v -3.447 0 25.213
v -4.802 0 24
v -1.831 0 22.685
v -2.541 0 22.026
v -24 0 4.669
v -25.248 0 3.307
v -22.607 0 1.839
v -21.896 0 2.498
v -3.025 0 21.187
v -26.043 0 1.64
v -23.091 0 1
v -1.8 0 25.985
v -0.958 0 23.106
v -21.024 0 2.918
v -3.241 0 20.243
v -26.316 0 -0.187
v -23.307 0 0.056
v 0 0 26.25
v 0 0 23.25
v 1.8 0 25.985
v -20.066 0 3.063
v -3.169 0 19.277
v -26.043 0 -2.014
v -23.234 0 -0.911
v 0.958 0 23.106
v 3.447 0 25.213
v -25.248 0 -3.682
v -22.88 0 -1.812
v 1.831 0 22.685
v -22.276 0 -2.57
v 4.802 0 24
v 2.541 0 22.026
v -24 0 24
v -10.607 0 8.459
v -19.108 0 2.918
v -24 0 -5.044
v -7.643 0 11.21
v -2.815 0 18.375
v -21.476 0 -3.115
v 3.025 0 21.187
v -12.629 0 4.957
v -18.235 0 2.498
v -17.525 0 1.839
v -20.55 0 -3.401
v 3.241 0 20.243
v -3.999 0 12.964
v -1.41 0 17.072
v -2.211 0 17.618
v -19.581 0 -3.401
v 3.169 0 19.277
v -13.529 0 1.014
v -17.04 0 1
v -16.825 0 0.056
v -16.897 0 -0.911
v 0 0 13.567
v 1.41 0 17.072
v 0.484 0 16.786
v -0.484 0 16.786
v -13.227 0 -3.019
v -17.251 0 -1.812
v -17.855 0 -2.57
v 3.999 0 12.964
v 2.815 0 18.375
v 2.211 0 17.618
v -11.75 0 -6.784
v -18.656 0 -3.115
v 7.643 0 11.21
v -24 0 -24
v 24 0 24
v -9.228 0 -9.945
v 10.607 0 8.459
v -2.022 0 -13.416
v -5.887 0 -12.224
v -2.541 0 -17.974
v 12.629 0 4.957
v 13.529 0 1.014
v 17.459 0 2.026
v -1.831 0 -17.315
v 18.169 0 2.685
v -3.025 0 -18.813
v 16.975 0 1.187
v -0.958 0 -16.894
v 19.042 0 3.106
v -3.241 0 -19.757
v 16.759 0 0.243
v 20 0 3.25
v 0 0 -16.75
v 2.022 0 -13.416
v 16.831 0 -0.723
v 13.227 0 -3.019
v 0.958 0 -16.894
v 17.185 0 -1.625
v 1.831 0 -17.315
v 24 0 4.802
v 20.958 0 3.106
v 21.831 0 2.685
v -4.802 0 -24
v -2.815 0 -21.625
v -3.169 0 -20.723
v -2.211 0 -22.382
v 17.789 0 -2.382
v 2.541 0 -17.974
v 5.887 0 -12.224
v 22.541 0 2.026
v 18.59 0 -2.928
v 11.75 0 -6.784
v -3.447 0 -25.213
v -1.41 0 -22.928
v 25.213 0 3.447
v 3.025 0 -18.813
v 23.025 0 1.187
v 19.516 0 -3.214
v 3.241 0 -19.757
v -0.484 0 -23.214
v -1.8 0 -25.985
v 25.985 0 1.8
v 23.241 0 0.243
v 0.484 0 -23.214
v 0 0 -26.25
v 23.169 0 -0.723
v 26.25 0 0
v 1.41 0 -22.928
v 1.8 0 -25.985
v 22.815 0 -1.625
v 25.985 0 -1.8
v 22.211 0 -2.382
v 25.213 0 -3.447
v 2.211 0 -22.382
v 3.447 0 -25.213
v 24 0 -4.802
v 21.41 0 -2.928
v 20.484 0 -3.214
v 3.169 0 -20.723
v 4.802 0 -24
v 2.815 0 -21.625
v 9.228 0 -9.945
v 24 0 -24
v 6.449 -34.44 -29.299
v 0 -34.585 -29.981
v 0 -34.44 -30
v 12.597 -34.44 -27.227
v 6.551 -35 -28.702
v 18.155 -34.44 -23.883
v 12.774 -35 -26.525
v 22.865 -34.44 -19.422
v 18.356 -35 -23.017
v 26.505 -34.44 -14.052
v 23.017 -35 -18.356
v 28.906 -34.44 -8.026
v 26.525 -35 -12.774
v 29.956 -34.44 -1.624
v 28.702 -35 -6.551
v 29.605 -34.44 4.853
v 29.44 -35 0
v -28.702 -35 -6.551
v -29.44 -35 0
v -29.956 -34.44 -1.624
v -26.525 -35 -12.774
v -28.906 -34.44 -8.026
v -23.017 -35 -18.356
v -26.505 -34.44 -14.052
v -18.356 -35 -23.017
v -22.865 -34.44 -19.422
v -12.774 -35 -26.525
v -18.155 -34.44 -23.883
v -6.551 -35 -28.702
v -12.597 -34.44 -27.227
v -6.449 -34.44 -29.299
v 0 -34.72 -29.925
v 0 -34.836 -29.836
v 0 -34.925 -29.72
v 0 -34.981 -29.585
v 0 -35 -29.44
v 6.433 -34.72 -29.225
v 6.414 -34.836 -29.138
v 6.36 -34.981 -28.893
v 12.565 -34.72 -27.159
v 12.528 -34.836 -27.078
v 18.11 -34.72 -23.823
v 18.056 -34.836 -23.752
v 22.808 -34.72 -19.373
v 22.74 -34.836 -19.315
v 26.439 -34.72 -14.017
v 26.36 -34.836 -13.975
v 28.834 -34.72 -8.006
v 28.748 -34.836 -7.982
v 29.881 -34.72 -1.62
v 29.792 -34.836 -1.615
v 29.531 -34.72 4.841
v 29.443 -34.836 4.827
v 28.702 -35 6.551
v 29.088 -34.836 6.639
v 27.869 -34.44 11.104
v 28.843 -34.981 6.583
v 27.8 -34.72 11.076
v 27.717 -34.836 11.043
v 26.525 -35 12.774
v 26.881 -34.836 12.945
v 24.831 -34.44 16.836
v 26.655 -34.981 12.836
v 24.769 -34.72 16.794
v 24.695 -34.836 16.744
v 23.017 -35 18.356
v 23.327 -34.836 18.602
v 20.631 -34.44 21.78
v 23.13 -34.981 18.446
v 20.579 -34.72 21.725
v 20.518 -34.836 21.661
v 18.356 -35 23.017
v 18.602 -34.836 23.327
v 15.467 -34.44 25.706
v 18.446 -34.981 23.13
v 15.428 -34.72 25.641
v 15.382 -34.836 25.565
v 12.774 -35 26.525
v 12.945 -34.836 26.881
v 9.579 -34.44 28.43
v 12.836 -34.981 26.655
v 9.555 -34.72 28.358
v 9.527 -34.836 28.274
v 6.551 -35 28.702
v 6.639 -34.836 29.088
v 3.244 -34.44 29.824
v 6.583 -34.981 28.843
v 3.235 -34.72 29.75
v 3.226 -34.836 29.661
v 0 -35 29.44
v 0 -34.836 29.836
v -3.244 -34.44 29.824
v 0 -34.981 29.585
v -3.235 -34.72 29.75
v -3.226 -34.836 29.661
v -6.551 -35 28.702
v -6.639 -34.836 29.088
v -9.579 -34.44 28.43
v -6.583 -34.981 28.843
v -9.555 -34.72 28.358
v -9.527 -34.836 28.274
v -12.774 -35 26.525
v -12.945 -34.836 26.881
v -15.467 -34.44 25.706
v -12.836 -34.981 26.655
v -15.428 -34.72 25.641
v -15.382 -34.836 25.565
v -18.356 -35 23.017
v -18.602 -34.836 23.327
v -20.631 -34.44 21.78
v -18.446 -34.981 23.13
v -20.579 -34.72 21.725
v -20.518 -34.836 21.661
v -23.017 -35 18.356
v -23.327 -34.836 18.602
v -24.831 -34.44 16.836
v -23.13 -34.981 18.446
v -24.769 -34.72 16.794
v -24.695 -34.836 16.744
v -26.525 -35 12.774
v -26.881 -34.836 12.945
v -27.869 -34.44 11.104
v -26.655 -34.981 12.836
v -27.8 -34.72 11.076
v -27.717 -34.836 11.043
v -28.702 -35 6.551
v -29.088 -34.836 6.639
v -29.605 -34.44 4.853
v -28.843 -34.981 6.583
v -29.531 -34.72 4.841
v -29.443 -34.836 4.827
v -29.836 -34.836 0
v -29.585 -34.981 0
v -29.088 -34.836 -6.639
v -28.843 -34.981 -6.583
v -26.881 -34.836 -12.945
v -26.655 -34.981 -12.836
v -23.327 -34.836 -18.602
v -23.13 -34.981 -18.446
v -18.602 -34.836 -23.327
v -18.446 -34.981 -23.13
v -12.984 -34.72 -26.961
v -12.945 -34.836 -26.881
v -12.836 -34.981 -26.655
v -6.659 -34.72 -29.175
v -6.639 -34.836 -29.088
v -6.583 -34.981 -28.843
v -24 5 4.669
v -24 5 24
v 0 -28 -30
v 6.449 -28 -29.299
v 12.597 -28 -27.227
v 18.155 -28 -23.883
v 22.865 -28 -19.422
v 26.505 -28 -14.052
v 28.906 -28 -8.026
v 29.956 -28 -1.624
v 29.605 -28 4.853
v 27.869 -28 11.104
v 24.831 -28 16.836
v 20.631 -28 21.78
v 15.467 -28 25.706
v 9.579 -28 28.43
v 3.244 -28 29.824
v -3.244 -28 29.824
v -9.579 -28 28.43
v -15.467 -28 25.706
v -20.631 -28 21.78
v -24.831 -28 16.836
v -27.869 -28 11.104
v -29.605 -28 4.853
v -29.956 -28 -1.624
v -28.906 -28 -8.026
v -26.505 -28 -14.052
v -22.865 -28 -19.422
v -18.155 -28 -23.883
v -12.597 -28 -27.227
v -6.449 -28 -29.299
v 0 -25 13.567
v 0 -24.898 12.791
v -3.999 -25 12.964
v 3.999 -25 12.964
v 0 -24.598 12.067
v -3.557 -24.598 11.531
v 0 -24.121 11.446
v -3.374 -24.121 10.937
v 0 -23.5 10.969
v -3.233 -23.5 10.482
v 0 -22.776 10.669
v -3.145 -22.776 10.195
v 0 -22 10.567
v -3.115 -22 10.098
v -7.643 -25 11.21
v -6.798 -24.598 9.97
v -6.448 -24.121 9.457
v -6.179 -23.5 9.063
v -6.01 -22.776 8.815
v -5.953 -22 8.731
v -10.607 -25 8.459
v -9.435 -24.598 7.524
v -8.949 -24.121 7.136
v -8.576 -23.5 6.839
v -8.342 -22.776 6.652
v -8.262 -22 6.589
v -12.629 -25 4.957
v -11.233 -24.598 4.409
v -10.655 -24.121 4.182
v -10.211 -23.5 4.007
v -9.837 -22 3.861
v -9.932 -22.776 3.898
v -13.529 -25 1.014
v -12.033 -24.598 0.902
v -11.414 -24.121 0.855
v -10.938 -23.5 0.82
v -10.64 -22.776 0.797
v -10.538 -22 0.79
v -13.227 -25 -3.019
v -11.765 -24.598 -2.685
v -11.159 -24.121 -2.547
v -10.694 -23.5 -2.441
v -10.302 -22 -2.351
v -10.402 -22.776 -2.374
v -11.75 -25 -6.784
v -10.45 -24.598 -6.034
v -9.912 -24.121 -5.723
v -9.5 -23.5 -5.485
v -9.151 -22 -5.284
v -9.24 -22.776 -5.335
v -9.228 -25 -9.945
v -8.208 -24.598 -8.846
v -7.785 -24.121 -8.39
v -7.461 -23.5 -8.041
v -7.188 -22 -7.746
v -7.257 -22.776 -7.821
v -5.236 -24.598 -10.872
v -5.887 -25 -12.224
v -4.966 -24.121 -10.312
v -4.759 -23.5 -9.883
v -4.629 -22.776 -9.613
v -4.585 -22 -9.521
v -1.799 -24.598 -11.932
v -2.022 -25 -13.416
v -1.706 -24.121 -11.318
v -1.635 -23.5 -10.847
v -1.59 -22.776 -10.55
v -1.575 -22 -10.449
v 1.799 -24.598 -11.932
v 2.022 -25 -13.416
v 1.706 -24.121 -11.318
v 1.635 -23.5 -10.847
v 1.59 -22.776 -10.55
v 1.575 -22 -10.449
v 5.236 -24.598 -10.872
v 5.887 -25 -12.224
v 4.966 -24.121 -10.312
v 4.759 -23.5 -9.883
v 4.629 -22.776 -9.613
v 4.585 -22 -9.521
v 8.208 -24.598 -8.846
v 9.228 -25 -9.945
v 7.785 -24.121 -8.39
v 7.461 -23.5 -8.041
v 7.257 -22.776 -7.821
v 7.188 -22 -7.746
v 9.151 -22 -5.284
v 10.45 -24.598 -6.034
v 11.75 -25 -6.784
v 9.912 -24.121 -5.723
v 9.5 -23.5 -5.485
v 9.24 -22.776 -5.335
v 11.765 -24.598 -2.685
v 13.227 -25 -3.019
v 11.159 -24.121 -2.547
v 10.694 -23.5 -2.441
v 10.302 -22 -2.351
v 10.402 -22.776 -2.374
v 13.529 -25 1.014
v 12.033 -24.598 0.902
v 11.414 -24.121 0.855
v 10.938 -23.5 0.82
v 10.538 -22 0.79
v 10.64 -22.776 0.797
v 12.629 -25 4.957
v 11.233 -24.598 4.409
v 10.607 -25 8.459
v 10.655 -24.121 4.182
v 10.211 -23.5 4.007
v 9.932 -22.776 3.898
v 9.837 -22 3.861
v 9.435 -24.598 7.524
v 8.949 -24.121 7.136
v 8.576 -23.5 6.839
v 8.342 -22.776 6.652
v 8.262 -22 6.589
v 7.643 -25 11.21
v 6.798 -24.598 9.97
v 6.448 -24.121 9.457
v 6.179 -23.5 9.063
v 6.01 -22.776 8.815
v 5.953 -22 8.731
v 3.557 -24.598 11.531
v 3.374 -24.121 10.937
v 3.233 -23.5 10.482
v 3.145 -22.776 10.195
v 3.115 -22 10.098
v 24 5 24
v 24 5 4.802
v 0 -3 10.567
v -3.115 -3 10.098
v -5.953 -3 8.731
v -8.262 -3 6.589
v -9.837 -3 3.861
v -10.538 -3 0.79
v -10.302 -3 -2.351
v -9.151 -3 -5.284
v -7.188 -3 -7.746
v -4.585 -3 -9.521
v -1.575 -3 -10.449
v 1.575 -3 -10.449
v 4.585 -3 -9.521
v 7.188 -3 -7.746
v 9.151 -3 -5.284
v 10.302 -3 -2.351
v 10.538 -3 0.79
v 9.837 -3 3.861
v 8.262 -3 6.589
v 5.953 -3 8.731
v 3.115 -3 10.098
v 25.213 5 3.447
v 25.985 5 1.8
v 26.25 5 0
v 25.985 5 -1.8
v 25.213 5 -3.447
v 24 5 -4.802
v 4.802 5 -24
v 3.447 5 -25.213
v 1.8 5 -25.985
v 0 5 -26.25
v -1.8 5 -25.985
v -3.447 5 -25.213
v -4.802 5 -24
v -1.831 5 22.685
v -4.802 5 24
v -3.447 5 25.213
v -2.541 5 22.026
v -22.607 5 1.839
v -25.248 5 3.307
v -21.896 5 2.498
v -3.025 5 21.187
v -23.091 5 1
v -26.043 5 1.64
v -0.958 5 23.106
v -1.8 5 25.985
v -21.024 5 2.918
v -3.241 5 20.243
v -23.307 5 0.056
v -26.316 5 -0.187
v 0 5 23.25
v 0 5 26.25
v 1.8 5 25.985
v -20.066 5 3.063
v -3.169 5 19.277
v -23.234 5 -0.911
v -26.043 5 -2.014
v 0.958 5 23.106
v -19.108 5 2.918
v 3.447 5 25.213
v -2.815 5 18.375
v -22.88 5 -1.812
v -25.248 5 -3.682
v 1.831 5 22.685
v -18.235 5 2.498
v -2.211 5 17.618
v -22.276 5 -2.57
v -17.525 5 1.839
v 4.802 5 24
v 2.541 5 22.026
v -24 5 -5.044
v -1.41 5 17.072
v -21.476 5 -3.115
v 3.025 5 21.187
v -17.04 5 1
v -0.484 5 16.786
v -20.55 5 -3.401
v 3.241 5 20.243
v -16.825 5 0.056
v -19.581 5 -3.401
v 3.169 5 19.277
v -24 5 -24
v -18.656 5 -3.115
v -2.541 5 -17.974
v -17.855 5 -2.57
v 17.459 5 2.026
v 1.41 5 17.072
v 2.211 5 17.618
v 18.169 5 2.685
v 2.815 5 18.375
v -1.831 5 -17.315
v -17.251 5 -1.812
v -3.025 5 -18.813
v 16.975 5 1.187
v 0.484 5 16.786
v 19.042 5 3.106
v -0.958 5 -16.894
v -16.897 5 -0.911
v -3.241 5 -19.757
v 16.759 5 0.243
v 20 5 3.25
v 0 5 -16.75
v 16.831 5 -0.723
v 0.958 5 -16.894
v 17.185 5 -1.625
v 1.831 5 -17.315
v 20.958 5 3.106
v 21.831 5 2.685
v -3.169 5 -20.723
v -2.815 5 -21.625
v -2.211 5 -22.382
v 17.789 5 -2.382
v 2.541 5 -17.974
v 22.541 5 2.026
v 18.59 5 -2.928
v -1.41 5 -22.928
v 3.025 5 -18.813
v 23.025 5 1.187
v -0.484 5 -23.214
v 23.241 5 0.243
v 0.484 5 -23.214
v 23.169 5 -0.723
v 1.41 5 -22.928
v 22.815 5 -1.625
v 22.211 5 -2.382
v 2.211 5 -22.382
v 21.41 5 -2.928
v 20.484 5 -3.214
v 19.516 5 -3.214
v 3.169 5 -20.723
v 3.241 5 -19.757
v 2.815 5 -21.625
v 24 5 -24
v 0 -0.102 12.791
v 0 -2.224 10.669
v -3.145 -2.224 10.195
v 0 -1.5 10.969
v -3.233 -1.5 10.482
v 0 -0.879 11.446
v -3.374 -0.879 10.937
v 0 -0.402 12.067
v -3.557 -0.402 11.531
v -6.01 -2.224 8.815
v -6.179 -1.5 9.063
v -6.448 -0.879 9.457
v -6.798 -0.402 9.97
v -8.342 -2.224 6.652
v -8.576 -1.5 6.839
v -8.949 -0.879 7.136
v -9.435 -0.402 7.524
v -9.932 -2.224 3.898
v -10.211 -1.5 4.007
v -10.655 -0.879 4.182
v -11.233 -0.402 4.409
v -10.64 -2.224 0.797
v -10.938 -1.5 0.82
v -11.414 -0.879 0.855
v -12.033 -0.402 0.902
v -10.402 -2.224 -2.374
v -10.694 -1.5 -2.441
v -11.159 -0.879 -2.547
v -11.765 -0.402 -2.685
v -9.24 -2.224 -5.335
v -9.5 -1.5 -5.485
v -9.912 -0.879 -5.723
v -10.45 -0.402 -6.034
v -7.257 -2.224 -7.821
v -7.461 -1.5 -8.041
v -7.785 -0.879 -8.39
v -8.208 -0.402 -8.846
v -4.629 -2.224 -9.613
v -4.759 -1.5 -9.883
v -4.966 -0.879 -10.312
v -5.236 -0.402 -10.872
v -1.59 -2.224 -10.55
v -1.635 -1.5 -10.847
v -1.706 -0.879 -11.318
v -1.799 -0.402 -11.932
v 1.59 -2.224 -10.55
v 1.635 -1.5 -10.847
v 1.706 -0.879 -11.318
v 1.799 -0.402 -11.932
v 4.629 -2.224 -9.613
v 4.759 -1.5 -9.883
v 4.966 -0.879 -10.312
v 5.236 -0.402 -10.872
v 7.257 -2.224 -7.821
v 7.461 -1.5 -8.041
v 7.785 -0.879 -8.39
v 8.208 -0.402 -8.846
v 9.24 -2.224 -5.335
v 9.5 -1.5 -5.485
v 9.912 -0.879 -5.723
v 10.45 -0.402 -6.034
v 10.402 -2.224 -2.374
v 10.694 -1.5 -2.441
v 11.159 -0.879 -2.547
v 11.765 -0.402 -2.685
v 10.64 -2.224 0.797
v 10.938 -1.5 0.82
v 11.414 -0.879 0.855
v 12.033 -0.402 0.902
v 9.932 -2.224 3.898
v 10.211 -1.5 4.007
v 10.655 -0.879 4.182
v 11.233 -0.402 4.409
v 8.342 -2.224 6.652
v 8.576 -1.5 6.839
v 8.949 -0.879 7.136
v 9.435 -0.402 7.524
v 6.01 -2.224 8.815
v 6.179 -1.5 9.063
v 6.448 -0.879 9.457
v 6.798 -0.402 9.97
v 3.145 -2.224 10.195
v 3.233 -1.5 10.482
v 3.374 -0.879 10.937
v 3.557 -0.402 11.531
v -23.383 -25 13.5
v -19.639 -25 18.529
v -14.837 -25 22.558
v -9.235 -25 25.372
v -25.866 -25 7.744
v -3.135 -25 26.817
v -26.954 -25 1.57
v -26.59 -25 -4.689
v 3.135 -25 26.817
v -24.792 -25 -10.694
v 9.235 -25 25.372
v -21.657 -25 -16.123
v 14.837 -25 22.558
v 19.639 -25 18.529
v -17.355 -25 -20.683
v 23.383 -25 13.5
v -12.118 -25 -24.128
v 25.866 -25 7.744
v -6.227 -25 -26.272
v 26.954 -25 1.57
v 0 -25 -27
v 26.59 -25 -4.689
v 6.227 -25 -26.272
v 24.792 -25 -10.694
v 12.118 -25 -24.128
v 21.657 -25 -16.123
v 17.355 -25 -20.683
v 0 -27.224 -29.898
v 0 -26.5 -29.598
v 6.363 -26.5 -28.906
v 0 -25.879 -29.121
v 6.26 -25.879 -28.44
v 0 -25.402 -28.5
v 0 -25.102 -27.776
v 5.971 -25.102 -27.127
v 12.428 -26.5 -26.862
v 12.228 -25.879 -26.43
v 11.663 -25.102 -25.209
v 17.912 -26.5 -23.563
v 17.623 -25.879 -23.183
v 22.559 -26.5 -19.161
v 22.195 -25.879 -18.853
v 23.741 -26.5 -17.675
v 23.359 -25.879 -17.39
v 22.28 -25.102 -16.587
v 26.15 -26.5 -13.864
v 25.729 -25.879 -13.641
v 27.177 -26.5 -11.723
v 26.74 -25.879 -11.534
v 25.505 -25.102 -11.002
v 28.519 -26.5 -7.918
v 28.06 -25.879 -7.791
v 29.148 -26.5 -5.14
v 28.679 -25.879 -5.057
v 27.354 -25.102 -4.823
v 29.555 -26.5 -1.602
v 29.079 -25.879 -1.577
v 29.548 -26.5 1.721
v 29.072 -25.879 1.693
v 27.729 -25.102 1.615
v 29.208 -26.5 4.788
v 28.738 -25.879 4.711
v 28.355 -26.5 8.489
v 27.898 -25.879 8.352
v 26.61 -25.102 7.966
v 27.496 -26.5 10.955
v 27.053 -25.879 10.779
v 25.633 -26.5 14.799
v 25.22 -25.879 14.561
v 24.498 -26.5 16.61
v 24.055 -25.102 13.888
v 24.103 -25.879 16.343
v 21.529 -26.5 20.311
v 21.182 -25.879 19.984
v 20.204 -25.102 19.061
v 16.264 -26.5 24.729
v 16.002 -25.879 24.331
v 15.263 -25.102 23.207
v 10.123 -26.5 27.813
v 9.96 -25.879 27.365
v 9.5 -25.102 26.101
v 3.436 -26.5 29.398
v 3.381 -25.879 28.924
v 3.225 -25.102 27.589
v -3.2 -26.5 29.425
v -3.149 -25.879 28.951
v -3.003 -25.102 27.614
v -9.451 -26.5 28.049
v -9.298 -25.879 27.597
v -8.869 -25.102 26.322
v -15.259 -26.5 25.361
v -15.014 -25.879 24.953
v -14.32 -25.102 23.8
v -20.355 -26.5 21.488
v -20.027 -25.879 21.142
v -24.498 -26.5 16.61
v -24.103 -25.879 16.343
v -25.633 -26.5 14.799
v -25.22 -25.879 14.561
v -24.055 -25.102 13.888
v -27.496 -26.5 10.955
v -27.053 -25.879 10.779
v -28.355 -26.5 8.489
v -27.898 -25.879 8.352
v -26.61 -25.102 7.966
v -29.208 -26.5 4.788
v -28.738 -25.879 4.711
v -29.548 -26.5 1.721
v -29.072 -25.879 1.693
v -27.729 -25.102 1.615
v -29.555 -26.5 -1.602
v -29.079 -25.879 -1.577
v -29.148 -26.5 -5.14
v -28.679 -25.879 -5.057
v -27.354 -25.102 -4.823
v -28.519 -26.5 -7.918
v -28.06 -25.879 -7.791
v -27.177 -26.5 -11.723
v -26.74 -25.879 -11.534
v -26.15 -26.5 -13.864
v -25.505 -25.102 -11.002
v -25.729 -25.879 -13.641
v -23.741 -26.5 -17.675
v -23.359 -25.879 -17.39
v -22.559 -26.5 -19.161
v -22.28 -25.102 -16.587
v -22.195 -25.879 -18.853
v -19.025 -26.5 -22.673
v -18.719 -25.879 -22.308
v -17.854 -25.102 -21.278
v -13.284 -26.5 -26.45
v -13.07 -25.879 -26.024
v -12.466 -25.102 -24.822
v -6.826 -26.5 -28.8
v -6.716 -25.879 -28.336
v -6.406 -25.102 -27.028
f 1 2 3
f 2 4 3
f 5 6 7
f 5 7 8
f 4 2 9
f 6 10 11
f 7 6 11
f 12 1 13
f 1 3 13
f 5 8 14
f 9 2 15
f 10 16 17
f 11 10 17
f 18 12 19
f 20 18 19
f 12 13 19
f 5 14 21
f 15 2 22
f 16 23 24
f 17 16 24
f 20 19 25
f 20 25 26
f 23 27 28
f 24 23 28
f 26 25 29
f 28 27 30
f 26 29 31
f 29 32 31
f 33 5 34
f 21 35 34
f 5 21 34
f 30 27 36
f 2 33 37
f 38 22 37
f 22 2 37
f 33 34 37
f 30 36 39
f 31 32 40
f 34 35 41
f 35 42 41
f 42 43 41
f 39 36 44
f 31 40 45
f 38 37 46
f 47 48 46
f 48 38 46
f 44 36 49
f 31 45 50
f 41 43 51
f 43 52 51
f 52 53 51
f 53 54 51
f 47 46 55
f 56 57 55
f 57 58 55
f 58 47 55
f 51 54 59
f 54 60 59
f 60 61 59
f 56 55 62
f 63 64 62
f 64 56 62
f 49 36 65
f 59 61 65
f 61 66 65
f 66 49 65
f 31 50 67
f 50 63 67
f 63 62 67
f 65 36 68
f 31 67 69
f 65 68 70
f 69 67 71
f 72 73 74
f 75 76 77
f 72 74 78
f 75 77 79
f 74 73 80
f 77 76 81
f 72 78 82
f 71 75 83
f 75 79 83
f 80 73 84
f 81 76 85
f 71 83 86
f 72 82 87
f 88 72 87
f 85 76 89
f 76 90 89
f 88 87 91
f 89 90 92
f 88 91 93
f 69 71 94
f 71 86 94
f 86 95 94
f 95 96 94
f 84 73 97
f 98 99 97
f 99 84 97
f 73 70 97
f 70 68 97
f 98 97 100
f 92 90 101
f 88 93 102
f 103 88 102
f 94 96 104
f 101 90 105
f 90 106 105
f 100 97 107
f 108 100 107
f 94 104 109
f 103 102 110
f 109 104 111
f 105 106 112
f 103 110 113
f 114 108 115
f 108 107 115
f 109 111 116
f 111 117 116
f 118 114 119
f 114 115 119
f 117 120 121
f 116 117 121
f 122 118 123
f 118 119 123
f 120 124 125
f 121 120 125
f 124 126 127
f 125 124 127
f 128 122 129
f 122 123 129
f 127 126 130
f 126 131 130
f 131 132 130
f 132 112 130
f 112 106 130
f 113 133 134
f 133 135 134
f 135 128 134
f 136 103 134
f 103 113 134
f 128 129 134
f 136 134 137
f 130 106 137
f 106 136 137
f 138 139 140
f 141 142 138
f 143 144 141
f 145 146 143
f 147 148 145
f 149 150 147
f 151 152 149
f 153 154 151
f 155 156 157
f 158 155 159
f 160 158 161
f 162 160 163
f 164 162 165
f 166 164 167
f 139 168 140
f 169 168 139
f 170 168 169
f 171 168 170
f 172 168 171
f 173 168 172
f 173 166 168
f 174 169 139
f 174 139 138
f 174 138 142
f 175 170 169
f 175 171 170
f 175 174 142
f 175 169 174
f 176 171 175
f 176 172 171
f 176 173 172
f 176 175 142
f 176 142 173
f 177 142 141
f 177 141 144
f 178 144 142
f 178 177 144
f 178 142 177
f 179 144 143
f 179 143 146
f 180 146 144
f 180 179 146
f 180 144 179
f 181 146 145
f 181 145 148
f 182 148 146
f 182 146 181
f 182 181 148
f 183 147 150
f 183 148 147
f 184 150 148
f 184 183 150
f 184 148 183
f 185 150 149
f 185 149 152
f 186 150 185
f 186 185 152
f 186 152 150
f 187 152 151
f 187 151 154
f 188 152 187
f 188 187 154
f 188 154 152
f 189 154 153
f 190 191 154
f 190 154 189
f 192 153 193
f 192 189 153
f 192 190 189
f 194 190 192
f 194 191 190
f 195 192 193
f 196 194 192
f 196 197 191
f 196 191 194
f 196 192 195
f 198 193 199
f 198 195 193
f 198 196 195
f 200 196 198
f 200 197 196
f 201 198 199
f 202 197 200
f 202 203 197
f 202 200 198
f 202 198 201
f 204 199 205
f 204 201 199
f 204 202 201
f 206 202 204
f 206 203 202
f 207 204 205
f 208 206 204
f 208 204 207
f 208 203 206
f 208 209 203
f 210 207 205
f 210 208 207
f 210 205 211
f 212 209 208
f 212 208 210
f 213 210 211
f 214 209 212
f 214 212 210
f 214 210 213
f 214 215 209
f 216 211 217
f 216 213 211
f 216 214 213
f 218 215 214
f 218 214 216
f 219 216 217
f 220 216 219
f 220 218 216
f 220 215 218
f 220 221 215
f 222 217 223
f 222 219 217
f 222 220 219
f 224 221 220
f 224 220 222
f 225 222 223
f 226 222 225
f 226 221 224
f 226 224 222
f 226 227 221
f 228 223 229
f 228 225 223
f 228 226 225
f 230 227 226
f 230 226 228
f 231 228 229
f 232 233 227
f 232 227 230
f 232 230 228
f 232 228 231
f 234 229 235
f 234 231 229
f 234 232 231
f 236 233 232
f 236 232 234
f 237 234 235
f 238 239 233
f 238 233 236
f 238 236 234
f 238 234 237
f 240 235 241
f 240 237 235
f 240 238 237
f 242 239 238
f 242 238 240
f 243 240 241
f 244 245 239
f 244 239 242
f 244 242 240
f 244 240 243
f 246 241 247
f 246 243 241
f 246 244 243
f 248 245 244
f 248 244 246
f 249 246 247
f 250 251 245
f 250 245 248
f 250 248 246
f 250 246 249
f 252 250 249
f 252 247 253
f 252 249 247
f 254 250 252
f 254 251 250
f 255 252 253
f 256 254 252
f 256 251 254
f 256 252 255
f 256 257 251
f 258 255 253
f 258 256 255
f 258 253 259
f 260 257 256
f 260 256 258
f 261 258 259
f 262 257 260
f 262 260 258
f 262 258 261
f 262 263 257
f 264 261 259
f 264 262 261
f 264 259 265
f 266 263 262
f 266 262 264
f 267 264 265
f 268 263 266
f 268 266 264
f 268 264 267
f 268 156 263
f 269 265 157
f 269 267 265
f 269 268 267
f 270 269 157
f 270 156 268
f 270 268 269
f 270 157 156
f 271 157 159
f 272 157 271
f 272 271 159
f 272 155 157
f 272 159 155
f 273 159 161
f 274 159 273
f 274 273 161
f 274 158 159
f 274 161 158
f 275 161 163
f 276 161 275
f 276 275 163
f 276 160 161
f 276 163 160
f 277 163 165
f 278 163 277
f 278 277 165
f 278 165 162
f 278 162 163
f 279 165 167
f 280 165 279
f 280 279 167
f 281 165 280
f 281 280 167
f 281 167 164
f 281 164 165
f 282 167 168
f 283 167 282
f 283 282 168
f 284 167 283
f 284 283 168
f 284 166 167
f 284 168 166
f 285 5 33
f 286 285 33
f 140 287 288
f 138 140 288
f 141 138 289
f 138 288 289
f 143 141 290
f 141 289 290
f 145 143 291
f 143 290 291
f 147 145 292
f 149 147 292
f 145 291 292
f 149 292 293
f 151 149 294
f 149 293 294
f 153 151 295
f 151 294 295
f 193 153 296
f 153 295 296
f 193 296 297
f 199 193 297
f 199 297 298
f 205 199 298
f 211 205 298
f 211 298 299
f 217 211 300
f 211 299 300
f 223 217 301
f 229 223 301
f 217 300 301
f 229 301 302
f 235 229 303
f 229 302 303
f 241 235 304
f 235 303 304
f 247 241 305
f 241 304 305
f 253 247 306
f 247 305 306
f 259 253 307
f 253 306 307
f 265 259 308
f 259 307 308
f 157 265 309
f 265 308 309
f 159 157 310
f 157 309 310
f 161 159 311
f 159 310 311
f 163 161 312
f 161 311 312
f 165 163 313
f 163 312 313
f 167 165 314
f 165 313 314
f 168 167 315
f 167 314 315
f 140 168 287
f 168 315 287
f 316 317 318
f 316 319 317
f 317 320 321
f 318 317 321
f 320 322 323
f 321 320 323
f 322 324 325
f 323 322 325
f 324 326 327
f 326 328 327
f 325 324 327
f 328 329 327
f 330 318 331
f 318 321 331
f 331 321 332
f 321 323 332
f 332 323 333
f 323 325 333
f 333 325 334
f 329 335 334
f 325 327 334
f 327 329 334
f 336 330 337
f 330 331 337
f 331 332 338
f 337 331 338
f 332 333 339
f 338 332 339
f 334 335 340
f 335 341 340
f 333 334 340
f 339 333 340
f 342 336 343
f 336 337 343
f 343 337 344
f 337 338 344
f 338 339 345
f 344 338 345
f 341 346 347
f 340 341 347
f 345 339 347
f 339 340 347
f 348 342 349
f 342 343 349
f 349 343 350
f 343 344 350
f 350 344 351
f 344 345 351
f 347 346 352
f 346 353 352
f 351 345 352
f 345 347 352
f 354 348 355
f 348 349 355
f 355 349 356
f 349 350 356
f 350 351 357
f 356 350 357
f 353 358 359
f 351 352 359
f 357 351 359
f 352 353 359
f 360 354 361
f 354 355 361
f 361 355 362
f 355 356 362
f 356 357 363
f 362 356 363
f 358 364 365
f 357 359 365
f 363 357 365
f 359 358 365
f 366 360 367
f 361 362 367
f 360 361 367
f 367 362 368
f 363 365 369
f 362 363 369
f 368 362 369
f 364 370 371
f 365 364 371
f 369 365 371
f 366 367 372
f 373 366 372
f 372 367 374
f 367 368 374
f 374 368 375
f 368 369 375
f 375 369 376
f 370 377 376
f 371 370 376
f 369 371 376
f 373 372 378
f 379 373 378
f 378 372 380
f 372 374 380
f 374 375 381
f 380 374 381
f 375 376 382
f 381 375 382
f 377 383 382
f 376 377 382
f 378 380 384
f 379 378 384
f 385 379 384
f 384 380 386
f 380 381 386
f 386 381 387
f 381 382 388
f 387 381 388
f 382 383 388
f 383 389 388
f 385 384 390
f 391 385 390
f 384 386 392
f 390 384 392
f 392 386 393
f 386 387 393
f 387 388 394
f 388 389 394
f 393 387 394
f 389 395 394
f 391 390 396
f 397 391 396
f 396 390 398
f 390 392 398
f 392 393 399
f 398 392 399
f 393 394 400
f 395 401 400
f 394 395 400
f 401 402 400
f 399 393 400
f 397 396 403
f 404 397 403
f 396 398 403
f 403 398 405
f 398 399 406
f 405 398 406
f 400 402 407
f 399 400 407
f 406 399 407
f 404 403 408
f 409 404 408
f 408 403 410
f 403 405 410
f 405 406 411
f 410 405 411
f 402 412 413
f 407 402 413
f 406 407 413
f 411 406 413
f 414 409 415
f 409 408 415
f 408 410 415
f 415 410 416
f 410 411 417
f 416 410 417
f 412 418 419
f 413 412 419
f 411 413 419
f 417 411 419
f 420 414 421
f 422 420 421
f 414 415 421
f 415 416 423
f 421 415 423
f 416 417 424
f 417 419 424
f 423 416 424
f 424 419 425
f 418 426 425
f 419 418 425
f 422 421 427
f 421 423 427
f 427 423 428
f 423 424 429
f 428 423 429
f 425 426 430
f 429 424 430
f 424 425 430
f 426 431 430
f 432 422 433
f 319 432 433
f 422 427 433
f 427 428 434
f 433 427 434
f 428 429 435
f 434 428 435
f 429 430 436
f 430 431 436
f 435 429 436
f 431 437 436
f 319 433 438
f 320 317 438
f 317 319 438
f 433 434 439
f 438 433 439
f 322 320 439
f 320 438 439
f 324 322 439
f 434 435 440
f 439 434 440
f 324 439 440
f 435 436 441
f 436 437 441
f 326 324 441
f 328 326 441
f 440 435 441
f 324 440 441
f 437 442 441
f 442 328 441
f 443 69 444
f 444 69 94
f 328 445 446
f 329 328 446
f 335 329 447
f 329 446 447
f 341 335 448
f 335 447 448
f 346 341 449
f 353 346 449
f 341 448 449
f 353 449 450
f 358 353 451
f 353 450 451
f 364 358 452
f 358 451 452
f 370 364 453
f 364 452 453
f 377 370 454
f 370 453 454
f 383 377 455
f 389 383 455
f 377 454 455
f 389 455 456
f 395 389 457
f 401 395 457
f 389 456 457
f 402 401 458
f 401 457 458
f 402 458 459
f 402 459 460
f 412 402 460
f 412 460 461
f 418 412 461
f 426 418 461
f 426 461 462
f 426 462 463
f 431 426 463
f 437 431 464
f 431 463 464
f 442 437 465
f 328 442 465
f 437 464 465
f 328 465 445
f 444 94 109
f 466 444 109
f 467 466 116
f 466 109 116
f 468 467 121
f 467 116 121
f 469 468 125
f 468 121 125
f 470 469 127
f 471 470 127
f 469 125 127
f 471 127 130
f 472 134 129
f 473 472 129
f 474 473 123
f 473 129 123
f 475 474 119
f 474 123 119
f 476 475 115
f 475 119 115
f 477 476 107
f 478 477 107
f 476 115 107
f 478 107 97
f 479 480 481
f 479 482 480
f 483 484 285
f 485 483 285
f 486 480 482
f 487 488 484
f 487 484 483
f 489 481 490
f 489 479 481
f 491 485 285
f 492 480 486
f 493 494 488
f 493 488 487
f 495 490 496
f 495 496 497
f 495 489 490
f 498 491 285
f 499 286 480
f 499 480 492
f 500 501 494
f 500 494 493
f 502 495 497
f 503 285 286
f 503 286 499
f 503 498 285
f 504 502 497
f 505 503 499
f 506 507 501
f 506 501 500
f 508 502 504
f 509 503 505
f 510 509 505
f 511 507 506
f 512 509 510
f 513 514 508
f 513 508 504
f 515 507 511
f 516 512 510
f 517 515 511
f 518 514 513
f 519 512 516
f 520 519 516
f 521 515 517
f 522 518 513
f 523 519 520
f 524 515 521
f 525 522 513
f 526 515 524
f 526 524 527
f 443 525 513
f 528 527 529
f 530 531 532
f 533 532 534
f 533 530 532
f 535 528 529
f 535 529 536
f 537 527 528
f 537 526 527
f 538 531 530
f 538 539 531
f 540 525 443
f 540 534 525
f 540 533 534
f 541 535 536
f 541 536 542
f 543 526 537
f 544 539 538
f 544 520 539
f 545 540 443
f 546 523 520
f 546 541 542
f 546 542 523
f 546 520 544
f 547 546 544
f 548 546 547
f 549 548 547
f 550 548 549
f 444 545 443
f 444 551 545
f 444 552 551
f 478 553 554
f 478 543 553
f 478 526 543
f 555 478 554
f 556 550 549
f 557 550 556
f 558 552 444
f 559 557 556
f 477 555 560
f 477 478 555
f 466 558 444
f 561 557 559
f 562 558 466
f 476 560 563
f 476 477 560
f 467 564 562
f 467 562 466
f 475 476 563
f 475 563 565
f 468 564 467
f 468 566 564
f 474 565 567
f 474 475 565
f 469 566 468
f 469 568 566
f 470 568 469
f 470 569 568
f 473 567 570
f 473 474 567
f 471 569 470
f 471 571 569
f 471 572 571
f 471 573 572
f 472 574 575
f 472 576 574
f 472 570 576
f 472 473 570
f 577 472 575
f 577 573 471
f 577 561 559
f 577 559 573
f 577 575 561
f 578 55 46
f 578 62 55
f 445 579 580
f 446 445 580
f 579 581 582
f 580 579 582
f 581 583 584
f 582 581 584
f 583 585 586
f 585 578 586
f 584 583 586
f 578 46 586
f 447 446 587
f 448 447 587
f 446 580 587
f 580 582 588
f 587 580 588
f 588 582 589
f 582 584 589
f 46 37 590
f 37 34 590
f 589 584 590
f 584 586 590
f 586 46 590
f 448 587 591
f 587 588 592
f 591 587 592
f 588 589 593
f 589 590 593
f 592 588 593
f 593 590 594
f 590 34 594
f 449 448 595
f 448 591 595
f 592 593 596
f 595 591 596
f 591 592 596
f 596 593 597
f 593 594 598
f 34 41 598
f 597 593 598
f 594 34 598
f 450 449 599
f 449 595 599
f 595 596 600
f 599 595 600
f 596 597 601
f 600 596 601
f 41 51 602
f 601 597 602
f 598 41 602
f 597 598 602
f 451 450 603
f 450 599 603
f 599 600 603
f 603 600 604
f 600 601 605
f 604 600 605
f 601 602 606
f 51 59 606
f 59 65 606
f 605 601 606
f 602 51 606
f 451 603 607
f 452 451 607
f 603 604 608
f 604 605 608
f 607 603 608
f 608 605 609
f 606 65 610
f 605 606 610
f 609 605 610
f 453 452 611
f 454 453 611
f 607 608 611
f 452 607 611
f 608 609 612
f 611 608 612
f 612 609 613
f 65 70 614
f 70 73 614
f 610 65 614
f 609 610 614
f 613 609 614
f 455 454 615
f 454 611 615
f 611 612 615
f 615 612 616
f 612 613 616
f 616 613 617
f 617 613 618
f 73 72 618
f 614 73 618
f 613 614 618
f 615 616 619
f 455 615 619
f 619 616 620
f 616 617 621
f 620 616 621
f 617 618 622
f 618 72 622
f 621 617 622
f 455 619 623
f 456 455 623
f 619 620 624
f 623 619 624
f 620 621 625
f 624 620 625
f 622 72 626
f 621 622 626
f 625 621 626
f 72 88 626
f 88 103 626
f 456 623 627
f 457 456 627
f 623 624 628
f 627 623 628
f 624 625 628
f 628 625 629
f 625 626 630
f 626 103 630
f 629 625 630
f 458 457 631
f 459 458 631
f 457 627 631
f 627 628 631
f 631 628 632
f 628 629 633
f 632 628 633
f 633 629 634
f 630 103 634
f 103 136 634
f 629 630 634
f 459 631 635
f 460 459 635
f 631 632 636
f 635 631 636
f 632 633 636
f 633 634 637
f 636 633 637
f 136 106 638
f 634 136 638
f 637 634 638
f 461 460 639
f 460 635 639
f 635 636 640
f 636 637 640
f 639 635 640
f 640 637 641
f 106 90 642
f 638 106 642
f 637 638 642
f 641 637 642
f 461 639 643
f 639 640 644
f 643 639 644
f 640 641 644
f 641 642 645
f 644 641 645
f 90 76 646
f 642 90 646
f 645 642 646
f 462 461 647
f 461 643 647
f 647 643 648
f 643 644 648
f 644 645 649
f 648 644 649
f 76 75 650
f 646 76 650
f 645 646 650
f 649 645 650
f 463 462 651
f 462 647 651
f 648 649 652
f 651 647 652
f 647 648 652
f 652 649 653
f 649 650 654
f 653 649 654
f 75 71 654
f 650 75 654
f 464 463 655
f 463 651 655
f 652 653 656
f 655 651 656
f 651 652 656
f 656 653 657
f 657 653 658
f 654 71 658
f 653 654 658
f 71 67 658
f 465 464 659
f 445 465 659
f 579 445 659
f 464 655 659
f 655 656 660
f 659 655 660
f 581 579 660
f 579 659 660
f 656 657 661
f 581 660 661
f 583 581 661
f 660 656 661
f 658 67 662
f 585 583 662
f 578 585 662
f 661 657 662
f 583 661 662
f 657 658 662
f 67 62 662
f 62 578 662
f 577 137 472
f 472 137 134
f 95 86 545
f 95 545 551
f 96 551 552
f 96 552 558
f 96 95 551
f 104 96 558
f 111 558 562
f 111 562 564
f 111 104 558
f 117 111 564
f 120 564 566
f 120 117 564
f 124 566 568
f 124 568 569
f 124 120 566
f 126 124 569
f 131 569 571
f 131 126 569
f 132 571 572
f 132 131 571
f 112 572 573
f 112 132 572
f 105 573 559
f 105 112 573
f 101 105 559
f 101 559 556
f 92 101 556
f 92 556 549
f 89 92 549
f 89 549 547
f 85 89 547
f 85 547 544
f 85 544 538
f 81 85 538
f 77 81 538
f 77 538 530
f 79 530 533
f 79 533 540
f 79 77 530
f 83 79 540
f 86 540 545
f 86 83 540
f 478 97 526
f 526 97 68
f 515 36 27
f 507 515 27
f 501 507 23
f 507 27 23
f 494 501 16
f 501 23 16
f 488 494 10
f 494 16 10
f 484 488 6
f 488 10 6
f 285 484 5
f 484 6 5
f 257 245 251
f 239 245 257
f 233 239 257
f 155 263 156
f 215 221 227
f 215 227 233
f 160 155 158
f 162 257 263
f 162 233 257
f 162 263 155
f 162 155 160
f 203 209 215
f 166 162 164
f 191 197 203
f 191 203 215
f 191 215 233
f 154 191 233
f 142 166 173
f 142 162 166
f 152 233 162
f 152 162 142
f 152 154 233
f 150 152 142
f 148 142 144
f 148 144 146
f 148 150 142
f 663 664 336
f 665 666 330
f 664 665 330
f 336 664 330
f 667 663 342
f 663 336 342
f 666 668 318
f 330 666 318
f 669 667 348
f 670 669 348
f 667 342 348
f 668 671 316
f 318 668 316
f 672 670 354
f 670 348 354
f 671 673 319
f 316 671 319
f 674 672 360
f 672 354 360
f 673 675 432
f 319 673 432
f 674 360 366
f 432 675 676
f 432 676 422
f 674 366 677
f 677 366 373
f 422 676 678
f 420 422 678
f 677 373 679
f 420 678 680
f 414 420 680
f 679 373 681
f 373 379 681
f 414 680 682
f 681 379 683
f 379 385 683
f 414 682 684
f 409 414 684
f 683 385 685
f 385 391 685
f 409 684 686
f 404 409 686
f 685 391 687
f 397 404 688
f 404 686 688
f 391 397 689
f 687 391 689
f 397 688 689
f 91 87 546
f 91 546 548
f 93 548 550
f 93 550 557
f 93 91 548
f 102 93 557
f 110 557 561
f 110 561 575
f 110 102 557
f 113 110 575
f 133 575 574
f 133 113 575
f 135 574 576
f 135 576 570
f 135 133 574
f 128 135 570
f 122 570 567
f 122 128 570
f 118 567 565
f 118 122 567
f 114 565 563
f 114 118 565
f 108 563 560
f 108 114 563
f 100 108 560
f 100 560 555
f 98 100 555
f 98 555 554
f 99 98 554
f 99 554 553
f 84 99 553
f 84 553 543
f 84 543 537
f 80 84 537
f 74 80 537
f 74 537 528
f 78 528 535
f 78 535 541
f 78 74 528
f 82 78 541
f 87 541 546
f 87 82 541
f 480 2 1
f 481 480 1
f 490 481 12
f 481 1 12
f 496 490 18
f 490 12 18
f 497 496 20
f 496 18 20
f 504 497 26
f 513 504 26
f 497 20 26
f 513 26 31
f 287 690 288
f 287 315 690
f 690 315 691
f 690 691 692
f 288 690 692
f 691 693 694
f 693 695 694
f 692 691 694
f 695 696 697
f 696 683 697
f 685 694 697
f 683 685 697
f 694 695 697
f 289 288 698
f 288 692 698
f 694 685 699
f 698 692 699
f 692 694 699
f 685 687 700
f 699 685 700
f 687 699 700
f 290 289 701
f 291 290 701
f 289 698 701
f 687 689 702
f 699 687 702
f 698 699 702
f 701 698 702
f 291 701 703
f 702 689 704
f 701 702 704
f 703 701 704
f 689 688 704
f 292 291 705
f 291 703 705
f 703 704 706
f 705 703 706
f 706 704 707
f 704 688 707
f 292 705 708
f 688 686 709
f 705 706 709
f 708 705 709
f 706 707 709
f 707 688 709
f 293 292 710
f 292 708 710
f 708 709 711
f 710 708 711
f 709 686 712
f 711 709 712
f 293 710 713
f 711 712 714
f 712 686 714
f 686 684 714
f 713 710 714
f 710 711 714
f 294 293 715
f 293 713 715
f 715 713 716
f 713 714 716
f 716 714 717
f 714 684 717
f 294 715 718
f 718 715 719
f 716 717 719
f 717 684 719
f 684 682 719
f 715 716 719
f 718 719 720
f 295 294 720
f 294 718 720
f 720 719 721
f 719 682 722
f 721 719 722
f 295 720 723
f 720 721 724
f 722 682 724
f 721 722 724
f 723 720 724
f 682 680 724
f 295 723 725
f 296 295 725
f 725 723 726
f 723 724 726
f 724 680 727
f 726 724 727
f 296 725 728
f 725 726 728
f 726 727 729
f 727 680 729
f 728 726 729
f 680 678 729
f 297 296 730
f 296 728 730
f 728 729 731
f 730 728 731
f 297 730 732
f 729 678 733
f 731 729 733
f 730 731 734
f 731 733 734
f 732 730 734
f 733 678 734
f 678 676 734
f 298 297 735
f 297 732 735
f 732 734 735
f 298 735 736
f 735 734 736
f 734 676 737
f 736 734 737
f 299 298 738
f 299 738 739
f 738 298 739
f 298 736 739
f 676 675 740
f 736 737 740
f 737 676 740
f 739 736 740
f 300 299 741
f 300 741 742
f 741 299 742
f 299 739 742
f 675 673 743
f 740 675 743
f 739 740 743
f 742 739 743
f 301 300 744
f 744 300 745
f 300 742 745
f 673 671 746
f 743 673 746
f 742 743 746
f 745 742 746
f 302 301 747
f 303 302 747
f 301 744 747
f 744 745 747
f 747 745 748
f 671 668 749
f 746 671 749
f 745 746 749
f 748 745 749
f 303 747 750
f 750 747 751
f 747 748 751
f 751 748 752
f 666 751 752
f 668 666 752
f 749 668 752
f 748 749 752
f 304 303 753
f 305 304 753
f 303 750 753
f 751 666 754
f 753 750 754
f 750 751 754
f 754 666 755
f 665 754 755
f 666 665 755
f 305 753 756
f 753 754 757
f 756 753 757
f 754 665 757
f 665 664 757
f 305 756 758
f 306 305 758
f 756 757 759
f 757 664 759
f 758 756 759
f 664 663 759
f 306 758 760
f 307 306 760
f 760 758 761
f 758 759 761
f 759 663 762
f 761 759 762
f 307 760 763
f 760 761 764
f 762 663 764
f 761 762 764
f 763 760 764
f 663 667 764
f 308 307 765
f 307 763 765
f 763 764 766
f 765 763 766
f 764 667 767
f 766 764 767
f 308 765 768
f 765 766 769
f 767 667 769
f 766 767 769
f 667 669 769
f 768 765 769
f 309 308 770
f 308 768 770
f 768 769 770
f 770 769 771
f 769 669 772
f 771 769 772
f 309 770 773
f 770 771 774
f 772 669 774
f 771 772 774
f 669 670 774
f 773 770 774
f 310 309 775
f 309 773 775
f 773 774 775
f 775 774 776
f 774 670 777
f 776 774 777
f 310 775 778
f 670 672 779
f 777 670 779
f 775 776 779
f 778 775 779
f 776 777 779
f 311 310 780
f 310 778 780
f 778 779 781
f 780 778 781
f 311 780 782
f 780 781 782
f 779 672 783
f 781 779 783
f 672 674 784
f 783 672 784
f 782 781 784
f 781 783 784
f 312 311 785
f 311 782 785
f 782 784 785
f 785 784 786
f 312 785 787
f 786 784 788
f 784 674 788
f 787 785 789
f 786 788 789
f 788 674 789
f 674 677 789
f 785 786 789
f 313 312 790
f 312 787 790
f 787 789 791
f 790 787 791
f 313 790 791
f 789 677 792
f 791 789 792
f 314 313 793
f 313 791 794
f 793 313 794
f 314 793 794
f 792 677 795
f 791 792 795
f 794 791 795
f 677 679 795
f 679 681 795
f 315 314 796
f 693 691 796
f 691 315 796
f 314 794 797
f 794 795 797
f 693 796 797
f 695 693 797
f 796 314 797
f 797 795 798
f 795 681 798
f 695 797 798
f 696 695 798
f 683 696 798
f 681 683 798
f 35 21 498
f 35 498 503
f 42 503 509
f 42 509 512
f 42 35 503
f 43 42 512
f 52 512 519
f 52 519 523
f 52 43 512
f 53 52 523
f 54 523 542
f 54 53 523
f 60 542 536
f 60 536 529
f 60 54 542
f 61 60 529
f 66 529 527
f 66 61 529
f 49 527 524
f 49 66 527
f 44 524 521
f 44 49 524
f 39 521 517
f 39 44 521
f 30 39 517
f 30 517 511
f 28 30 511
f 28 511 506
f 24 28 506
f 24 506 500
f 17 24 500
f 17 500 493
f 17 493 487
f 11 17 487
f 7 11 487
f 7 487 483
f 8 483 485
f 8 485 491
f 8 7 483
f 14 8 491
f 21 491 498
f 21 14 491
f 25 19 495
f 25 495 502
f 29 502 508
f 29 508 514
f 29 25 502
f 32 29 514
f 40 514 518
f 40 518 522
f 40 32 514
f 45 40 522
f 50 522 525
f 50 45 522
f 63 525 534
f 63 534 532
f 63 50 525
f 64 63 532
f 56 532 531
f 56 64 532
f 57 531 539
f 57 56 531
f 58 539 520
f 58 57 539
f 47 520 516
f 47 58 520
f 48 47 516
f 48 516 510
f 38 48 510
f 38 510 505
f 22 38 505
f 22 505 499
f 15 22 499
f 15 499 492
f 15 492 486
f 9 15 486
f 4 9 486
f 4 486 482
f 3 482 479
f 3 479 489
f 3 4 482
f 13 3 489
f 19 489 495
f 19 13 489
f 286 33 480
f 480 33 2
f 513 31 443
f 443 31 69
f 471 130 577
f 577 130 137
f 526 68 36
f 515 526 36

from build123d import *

# Parameters (mm, degrees)
SKETCH1_R           = 3.25
BOSS_EXTRUDE1_DEPTH = 5
SKETCH2_W           = 32.64938716
SKETCH2_H           = 32.90693226
BOSS_EXTRUDE2_DEPTH = 5
SKETCH3_R           = 10.567193536
BOSS_EXTRUDE3_DEPTH = 25
SKETCH4_R           = 30
BOSS_EXTRUDE4_DEPTH = 10
FILLET1_R           = 3
FILLET2_R           = 0.56
FILLET3_R           = 3


with BuildPart() as part:
    # Sketch1 → Boss-Extrude1 (new body)
    with BuildSketch(Plane(origin=(0, 0, 0), x_dir=(1, 0, 0), z_dir=(0, 1, 0))):
        with BuildLine():
            Line((-24, -4.668943148), (-24, -24))
            Line((-24, -24), (-4.802343178, -24))
            ThreePointArc((-4.802343178, -24), (0, -26.25), (4.802343178, -24))
            Line((4.802343178, -24), (24, -24))
            Line((24, -24), (24, -4.802343178))
            ThreePointArc((24, -4.802343178), (26.25, 0), (24, 4.802343178))
            Line((24, 4.802343178), (24, 24))
            Line((24, 24), (4.802343178, 24))
            ThreePointArc((4.802343178, 24), (0, 26.25), (-4.802343178, 24))
            Line((-4.802343178, 24), (-24, 24))
            Line((-24, 24), (-24, 5.04363247))
            ThreePointArc((-24, 5.04363247), (-26.315667945, 0.187344661), (-24, -4.668943148))
        make_face()
        with Locations(Location((-20.065667945, 0.187344661, 0), (0, 0, 270))):
            Circle(SKETCH1_R, mode=Mode.SUBTRACT)
        with Locations(Location((0, 20, 0), (0, 0, 270))):
            Circle(SKETCH1_R, mode=Mode.SUBTRACT)
        with Locations(Location((20, 0, 0), (0, 0, 270))):
            Circle(SKETCH1_R, mode=Mode.SUBTRACT)
        with Locations(Location((0, -20, 0), (0, 0, 270))):
            Circle(SKETCH1_R, mode=Mode.SUBTRACT)
        with BuildLine():
            Line((-16, 16), (-4.802343178, 16))
            ThreePointArc((-4.802343178, 16), (0, 13.75), (4.802343178, 16))
            Line((4.802343178, 16), (16, 16))
            Line((16, 16), (16, 4.802343178))
            ThreePointArc((16, 4.802343178), (13.75, 0), (16, -4.802343178))
            Line((16, -4.802343178), (16, -16))
            Line((16, -16), (4.802343178, -16))
            ThreePointArc((4.802343178, -16), (0, -13.75), (-4.802343178, -16))
            Line((-4.802343178, -16), (-16, -16))
            Line((-16, -16), (-16, -4.559532645))
            ThreePointArc((-16, -4.559532645), (-13.815667945, 0.187344661), (-16, 4.934221967))
            Line((-16, 4.934221967), (-16, 16))
        make_face(mode=Mode.SUBTRACT)
    extrude(amount=BOSS_EXTRUDE1_DEPTH)

    # Sketch2 → Boss-Extrude2 (add)
    with BuildSketch(Plane.XZ):
        Rectangle(SKETCH2_W, SKETCH2_H)
    extrude(amount=-BOSS_EXTRUDE2_DEPTH)

    # Sketch3 → Boss-Extrude3 (add)
    with BuildSketch(Plane(origin=(0, 0, 0), x_dir=(-1, 0, 0), z_dir=(0, -1, 0))):
        with Locations(Location((0, 0, 0), (0, 0, 270))):
            Circle(SKETCH3_R)
    extrude(amount=BOSS_EXTRUDE3_DEPTH)

    # Sketch4 → Boss-Extrude4 (add)
    with BuildSketch(Plane(origin=(0, -25, 0), x_dir=(-1, 0, 0), z_dir=(0, -1, 0))):
        with Locations(Location((0, 0, 0), (0, 0, 90))):
            Circle(SKETCH4_R)
    extrude(amount=BOSS_EXTRUDE4_DEPTH)

    # Fillet1
    fillet1_edges = [part.edges().sort_by_distance(p)[0] for p in [
        (0, 0, -10.567193536),
    ]]
    fillet(fillet1_edges, radius=FILLET1_R)

    # Fillet2
    fillet2_edges = [part.edges().sort_by_distance(p)[0] for p in [
        (0, -35, 30),
    ]]
    fillet(fillet2_edges, radius=FILLET2_R)

    # Fillet3
    fillet3_edges = [part.edges().sort_by_distance(p)[0] for p in [
        (0, -25, -10.567193536),
        (0, -25, 30),
    ]]
    fillet(fillet3_edges, radius=FILLET3_R)


solid = part.part
